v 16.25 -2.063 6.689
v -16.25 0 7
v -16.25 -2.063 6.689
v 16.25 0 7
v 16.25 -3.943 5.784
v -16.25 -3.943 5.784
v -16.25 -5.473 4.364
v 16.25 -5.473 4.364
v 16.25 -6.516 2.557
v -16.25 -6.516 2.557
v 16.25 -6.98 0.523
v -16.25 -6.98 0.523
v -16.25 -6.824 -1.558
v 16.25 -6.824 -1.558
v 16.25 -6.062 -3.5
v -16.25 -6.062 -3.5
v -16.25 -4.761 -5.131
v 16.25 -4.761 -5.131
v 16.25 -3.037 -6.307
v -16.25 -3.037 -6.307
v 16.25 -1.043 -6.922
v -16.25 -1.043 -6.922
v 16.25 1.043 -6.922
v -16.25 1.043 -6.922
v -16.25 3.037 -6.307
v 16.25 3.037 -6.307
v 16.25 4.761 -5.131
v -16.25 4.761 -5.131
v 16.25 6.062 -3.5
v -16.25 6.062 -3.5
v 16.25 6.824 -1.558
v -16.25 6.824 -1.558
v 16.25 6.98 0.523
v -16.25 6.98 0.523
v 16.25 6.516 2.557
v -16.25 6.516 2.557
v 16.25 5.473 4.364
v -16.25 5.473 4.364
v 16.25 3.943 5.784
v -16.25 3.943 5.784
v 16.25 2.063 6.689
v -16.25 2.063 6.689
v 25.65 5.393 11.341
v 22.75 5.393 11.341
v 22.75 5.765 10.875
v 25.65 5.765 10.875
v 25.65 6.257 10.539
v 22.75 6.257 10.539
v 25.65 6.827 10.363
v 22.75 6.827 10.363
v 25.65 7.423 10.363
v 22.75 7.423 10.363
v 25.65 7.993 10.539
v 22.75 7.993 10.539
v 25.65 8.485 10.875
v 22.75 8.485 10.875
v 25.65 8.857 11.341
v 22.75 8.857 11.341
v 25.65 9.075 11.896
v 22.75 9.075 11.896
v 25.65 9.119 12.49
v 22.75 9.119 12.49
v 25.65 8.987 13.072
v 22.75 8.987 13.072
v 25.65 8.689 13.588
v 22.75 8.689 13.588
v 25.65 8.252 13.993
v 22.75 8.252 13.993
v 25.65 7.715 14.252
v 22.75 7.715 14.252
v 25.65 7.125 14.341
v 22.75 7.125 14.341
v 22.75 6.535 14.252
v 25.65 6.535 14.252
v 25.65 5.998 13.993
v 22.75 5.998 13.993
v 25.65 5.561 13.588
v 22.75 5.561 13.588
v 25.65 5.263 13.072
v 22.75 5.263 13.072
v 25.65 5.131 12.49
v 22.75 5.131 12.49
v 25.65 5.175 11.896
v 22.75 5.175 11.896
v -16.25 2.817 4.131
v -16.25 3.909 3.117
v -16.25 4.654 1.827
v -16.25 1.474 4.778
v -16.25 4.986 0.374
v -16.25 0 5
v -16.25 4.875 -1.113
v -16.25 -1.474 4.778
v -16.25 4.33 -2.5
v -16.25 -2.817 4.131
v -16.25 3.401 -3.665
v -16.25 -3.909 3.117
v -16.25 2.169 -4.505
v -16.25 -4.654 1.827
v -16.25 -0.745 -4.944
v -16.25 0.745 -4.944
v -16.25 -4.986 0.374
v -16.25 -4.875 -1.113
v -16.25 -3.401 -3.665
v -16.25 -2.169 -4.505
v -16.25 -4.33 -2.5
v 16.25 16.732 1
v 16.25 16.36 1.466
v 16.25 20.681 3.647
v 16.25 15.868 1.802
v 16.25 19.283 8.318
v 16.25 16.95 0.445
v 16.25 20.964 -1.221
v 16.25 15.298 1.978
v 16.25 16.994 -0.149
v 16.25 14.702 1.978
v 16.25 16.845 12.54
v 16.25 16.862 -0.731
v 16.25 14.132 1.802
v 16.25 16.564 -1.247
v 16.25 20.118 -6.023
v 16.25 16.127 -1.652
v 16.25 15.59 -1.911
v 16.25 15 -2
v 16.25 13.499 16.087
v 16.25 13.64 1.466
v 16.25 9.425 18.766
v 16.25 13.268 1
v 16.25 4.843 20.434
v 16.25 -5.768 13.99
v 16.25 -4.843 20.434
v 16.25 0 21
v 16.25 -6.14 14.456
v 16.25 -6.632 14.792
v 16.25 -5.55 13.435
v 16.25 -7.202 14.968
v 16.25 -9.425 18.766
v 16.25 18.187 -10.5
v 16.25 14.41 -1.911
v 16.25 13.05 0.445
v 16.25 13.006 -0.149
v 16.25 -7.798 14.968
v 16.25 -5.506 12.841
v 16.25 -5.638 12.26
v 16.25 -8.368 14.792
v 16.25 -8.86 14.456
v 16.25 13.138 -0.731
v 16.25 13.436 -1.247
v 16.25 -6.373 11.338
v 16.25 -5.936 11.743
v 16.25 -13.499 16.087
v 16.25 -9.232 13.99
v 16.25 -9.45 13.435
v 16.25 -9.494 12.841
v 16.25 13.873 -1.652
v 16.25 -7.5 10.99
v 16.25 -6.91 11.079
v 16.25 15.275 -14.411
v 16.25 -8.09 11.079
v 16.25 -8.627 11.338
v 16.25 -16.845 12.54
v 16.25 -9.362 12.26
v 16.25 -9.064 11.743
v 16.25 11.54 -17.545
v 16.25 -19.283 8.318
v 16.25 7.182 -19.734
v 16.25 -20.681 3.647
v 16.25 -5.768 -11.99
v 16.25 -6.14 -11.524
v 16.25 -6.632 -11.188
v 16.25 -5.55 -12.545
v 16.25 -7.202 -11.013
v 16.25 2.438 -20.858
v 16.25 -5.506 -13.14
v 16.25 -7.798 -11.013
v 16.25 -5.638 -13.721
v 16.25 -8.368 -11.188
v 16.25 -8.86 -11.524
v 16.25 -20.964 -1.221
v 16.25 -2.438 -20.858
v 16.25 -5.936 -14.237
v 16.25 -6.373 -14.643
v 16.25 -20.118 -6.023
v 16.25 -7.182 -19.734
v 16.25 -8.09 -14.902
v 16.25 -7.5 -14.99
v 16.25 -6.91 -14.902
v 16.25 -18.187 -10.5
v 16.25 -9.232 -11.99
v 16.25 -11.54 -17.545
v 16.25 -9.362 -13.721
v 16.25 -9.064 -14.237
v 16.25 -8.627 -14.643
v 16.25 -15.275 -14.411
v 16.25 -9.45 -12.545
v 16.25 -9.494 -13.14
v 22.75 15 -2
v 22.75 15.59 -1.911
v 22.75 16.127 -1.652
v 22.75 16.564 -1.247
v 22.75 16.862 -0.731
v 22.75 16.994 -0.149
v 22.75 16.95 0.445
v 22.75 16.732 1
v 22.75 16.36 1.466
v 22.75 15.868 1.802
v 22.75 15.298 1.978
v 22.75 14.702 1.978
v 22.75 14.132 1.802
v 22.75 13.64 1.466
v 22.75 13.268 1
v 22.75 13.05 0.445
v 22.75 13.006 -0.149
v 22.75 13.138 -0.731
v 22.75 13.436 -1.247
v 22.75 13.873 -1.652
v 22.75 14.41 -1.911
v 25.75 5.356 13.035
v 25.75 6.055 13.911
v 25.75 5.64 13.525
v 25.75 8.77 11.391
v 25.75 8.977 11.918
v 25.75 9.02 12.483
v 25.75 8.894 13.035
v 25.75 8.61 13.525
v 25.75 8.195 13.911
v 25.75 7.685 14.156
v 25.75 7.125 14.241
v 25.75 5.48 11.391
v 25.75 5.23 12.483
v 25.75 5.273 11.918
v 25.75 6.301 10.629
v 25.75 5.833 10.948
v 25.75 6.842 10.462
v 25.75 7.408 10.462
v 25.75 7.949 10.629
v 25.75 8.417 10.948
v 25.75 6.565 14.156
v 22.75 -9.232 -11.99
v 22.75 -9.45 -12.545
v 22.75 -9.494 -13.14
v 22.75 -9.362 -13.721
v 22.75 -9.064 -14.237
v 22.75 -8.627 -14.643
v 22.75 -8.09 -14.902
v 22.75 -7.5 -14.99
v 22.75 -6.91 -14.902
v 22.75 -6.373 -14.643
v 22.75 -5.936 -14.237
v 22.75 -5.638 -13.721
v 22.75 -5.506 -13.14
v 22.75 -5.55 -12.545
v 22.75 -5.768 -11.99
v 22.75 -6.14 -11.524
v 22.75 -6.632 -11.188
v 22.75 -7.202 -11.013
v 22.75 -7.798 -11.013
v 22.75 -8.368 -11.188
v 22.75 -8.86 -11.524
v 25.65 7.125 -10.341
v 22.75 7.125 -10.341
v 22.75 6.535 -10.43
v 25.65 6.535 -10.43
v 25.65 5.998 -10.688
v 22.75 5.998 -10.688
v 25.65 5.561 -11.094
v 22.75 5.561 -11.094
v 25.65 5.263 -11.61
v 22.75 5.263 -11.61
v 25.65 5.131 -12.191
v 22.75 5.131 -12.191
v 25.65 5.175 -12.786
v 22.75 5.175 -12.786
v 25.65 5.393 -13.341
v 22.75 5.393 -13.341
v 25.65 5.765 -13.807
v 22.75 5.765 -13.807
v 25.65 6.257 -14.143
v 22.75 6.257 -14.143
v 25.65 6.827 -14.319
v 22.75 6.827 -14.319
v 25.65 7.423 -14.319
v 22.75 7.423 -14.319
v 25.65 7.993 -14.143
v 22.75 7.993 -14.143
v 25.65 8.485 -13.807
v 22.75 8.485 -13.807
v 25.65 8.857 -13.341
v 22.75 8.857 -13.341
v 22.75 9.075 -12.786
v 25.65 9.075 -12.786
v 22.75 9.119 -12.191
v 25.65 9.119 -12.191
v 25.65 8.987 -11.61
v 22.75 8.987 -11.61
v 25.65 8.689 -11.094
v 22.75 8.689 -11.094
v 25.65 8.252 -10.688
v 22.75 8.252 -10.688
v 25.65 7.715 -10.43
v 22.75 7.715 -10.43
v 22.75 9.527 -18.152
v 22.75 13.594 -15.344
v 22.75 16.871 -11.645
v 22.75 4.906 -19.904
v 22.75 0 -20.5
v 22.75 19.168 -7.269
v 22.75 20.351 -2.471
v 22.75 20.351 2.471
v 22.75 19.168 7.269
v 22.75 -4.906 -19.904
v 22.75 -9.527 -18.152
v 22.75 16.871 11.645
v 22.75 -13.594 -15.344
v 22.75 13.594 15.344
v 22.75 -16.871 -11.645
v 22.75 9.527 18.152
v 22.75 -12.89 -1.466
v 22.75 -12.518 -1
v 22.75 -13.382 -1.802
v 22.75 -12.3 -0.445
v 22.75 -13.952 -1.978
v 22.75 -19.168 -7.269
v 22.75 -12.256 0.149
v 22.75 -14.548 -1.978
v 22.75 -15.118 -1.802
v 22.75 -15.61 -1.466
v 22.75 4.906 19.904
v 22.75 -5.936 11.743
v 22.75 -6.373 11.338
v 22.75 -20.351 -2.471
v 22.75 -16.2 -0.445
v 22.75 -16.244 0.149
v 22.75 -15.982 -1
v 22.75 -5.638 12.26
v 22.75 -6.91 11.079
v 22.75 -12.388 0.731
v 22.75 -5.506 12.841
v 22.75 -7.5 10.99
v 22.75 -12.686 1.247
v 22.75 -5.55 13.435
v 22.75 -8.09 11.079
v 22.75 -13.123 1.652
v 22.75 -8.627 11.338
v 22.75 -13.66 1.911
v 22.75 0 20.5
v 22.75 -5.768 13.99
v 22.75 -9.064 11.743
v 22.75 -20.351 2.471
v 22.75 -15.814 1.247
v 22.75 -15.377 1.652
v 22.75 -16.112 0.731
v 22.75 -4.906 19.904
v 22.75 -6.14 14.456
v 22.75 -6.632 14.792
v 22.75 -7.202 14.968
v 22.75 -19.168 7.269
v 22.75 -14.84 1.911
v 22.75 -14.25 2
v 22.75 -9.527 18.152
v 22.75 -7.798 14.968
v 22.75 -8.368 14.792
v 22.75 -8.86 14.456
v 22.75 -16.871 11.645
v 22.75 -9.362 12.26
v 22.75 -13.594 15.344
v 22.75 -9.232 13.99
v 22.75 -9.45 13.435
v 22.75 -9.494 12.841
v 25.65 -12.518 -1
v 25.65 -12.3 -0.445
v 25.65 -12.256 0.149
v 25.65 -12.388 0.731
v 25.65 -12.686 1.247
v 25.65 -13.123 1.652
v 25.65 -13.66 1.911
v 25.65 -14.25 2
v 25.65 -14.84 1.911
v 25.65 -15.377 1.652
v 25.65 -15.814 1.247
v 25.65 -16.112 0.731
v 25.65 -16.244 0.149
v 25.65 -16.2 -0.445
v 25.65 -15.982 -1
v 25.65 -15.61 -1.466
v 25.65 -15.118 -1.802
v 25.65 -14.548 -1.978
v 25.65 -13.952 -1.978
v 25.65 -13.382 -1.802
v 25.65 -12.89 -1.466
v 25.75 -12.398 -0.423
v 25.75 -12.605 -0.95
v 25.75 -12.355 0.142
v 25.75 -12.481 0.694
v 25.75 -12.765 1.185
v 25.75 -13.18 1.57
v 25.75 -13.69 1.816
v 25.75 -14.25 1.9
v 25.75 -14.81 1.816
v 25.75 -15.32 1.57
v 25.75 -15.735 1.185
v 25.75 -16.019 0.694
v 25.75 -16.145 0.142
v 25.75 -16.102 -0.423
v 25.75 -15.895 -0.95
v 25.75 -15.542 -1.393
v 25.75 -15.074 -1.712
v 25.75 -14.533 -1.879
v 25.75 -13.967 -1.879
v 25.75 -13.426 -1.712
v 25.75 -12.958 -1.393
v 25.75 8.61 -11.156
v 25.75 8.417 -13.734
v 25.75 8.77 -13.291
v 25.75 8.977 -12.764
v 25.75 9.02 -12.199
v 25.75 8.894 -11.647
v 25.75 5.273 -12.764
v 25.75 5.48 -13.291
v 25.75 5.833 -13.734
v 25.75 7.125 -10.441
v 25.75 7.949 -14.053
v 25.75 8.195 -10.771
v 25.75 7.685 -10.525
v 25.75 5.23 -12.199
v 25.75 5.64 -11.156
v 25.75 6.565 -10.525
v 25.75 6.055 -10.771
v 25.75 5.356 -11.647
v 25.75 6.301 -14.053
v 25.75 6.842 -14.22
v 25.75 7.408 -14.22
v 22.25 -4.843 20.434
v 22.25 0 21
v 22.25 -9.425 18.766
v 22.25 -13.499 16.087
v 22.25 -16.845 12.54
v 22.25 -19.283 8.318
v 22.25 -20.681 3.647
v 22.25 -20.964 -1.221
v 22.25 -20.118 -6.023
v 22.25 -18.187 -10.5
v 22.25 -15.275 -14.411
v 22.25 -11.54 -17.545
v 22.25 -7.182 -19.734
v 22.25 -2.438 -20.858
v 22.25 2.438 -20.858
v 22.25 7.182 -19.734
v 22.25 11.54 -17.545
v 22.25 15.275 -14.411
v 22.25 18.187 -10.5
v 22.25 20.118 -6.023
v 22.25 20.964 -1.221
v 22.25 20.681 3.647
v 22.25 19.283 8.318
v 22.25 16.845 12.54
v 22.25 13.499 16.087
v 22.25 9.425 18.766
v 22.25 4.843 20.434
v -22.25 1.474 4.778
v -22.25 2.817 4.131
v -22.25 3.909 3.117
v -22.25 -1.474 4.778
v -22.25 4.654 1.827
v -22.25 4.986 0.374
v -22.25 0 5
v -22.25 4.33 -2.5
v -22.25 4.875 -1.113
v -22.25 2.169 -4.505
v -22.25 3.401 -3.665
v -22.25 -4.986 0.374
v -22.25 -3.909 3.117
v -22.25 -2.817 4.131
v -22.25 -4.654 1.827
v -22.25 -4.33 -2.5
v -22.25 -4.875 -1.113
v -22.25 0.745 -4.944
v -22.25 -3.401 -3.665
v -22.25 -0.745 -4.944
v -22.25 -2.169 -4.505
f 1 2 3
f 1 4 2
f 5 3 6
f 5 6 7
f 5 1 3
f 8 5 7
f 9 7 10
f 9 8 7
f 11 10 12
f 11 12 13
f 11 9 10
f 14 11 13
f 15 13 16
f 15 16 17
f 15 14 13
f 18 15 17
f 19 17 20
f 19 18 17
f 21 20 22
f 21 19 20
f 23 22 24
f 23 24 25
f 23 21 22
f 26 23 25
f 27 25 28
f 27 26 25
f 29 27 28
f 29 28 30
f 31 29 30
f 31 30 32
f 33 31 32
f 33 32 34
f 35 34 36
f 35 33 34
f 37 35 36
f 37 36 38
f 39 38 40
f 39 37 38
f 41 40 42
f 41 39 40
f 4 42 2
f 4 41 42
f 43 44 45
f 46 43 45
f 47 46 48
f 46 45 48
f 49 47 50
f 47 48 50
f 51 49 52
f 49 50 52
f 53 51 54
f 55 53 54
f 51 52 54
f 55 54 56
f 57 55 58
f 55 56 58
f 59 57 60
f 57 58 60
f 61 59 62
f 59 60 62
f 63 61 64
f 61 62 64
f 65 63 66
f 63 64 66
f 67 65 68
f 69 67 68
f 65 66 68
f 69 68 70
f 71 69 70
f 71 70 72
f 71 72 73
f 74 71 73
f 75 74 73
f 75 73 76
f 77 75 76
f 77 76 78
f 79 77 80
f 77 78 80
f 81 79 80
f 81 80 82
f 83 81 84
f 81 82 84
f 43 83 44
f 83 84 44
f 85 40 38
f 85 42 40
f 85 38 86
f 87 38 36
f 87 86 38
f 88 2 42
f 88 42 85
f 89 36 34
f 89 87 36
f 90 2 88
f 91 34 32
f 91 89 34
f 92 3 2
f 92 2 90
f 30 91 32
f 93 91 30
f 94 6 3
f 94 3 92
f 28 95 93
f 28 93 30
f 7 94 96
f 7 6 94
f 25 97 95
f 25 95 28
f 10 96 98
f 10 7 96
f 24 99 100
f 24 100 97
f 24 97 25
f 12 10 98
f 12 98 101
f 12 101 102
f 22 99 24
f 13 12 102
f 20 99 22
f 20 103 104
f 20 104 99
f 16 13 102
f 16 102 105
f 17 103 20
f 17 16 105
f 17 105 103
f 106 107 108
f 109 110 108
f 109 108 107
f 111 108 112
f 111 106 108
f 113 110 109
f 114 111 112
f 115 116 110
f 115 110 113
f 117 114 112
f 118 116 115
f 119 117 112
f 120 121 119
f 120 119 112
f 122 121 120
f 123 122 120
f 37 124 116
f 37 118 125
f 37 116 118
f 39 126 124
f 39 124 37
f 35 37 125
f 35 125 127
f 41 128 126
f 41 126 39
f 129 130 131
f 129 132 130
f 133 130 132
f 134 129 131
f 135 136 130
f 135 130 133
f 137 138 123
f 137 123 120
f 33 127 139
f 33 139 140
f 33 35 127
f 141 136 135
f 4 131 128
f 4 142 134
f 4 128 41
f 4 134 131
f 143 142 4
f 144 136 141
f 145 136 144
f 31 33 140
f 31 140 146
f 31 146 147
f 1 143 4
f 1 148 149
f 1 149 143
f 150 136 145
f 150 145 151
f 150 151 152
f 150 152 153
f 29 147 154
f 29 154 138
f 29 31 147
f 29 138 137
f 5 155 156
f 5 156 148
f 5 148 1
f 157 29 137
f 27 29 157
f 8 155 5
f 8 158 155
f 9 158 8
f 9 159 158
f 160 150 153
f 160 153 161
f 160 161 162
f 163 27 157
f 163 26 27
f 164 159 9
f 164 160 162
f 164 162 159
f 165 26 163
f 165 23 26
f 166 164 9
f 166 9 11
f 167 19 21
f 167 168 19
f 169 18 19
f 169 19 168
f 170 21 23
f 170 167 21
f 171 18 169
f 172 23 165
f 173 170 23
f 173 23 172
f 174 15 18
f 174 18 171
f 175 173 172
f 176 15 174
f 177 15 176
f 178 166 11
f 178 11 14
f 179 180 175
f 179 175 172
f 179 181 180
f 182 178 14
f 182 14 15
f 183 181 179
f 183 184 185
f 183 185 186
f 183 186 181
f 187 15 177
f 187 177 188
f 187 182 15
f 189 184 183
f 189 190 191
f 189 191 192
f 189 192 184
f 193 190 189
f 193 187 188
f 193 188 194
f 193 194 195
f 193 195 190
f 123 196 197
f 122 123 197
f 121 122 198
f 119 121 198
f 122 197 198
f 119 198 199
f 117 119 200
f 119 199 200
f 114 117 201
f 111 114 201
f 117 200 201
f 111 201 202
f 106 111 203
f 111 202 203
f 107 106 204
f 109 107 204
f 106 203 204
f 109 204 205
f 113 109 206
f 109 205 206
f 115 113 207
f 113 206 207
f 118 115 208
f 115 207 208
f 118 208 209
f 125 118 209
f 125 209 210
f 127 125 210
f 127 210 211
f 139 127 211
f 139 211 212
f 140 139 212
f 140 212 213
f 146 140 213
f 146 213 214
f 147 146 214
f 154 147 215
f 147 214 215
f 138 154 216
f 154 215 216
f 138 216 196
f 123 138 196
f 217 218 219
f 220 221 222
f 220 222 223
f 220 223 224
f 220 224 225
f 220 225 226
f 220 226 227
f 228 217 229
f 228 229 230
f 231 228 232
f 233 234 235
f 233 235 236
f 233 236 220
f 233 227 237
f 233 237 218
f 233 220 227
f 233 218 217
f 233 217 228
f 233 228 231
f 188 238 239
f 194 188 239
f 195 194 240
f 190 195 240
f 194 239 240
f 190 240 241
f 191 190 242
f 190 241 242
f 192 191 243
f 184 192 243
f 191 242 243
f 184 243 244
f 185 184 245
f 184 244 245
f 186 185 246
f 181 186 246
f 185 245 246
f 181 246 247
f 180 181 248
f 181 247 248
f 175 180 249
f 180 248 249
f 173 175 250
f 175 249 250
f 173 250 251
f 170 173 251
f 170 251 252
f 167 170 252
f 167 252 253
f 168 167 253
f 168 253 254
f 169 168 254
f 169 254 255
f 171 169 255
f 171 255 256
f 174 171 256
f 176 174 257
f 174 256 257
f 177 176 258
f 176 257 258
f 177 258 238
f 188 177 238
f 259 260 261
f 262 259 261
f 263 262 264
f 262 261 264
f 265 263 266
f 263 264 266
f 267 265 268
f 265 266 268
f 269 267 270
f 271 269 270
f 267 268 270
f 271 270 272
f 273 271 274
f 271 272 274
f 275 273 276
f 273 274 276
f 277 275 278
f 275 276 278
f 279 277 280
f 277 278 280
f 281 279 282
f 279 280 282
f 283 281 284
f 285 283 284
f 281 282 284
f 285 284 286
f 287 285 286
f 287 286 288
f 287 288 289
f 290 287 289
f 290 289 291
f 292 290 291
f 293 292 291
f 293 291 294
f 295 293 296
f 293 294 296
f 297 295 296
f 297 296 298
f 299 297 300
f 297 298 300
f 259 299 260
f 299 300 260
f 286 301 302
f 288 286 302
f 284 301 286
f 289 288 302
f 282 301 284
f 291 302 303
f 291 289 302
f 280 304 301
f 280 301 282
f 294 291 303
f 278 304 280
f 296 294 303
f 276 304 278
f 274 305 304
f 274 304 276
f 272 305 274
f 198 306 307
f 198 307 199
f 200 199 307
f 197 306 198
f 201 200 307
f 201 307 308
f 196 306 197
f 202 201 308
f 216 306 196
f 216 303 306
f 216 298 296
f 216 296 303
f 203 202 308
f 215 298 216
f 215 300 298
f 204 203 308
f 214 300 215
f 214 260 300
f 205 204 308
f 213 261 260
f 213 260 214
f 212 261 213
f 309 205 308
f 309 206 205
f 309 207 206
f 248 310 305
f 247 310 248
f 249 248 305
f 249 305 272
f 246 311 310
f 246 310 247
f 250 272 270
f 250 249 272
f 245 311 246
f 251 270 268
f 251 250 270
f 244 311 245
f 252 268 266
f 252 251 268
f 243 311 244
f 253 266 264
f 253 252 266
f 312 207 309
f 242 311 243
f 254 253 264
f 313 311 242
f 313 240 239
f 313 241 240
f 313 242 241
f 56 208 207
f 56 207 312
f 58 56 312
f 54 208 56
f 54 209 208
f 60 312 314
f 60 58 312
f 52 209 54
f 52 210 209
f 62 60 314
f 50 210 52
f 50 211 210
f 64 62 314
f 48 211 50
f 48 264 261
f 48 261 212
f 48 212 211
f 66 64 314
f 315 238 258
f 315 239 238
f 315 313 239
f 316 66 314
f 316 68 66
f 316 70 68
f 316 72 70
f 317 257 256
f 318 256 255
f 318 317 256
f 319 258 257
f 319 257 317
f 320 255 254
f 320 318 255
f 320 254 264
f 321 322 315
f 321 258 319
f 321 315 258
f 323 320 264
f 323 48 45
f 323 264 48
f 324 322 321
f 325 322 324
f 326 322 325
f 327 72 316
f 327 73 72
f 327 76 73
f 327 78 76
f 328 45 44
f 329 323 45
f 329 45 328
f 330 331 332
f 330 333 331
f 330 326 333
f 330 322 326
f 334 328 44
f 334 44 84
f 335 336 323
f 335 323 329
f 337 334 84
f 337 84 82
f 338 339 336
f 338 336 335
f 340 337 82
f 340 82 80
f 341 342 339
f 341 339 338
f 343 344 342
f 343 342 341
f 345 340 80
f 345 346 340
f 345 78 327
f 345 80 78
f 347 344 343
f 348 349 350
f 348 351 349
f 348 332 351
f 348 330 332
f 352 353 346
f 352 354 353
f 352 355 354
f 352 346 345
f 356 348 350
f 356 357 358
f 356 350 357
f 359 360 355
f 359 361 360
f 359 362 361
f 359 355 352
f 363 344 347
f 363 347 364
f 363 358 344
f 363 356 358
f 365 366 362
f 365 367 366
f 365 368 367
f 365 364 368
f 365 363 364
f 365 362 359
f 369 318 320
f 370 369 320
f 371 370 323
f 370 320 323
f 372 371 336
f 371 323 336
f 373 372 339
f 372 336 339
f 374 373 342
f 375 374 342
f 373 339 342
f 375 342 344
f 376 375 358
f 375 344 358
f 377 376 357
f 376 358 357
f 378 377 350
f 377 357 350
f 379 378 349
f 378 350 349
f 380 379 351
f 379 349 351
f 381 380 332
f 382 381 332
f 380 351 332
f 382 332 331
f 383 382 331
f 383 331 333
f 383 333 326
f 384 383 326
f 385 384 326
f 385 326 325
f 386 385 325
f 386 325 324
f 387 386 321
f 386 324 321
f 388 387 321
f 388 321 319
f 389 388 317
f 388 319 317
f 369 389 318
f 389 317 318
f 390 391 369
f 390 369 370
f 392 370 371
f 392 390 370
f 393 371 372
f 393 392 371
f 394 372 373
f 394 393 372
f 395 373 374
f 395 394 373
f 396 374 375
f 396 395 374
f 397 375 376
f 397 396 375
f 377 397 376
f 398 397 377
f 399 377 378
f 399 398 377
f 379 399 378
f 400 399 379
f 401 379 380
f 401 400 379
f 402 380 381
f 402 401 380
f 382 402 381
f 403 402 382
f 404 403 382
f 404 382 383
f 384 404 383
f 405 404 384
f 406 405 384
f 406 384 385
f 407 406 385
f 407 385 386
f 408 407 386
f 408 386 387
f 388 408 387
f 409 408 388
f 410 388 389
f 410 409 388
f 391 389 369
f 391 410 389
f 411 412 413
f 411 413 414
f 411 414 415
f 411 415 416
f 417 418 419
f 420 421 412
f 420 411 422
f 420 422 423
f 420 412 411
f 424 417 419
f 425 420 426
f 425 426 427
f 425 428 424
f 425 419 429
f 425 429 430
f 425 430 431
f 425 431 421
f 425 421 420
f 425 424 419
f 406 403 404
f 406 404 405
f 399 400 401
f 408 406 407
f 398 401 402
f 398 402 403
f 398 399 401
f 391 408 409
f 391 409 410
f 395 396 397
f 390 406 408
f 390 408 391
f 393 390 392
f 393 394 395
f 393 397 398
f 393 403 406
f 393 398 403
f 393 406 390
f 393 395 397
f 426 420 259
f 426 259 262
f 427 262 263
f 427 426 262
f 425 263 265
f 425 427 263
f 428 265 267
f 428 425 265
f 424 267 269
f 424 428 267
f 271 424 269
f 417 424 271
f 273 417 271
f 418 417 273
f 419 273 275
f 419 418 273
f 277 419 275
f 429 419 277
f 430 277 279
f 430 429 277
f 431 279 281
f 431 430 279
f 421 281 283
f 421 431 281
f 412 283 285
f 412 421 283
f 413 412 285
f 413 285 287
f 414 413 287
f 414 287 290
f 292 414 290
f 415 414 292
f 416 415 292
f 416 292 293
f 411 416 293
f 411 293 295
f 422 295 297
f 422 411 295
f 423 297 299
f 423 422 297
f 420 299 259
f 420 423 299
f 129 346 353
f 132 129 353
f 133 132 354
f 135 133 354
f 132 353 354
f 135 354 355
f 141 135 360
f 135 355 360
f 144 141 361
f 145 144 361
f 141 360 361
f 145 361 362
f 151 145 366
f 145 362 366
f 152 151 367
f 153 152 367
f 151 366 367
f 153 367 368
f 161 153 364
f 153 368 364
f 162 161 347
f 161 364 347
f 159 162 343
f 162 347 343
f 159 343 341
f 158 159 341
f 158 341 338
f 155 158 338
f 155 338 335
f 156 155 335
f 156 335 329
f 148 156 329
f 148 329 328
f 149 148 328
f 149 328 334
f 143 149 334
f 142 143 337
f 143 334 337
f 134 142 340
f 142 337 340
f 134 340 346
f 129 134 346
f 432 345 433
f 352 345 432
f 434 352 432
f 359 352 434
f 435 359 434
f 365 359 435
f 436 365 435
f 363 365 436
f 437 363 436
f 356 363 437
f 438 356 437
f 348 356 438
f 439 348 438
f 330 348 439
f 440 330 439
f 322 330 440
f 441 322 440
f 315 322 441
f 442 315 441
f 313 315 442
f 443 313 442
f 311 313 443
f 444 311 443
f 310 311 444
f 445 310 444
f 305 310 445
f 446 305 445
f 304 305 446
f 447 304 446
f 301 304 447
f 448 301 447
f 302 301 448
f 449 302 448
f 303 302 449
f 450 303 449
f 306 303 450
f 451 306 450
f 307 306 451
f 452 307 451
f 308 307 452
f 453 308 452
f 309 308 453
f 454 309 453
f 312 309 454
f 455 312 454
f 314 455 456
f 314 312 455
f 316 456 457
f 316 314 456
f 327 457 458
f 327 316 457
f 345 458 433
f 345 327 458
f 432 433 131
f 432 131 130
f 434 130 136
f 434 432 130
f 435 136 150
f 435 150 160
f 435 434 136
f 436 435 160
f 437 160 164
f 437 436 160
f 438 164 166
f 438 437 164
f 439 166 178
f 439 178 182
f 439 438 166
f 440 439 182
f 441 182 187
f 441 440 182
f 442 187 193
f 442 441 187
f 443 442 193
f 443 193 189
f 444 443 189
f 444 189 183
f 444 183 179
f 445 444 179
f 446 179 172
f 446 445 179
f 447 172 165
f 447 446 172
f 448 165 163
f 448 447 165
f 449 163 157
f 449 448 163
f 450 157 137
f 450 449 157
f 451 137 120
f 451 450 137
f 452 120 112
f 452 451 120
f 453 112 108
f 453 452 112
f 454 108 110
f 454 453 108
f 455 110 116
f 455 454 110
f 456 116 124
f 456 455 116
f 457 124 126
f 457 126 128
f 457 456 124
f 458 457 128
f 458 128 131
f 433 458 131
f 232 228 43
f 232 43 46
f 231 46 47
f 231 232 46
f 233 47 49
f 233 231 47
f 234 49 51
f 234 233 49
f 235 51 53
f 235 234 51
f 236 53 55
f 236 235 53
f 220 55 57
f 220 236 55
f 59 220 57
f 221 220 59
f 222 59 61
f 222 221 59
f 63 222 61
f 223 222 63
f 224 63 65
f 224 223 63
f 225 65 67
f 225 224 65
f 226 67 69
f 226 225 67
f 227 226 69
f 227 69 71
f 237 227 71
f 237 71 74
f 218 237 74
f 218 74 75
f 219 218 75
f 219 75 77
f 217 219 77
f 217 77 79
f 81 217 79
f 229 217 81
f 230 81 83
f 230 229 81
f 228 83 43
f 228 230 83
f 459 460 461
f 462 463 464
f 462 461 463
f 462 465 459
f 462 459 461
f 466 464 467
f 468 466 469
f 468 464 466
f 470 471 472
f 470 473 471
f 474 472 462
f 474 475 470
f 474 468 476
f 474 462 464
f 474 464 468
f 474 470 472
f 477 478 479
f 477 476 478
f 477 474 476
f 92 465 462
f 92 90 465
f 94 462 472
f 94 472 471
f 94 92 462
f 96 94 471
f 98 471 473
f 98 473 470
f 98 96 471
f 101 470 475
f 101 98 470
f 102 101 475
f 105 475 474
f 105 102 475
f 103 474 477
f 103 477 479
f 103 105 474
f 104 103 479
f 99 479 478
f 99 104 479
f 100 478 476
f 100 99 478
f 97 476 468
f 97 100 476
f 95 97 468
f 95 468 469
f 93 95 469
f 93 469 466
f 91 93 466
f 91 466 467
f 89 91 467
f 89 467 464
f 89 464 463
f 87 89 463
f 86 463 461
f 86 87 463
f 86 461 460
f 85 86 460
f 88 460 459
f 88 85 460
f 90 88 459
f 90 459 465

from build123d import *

# Parameters (mm, degrees)
CHAMFER1_SIZE                = 0.5
SKETCH2_R                    = 2
CUT_EXTRUDE1_DEPTH           = 6.5
CIRPATTERN1_COUNT            = 3
SKETCH3_R                    = 2
BOSS_EXTRUDE1_DEPTH          = 3
CHAMFER2_SIZE                = 0.1
CIRPATTERN3_COUNT            = 3
CHAMFER2_OF_CIRPATTERN3_SIZE = 0.1


with BuildPart() as part:
    # Sketch1 → Revolve1 (revolve)
    with BuildSketch(Plane.XY, mode=Mode.PRIVATE) as revolve1_sk:
        Polygon((-22.25, 0), (-22.25, 5), (-16.25, 5), (-16.25, 7), (16.25, 7), (16.25, 21), (22.75, 21), (22.75, 0), align=None)
    revolve(revolve1_sk.sketch.rotate(Axis((-54.078202457, 0, 0), (1, 0, 0)), 90), axis=Axis((-54.078202457, 0, 0), (1, 0, 0)))

    # Chamfer1
    chamfer1_edges = [part.edges().sort_by_distance(p)[0] for p in [
        (22.75, 0, -21),
    ]]
    chamfer(chamfer1_edges, length=CHAMFER1_SIZE)

    # Sketch2 → Cut-Extrude1 (cut)
    with BuildSketch(Plane(origin=(22.75, 0, 0), x_dir=(0, 0, -1), z_dir=(1, 0, 0))):
        with Locations((0, 15)):
            Circle(SKETCH2_R)
    cut_extrude1 = extrude(amount=-CUT_EXTRUDE1_DEPTH, mode=Mode.SUBTRACT)

    # CirPattern1: Cut-Extrude1 ×3 about axis
    cirpattern1_axis = Axis((0, 0, 0), (1, 0, 0))
    for i in range(1, CIRPATTERN1_COUNT):
        add(cut_extrude1.rotate(cirpattern1_axis, i * 360 / CIRPATTERN1_COUNT), mode=Mode.SUBTRACT)

    # Sketch3 → Boss-Extrude1 (add)
    with BuildSketch(Plane(origin=(22.75, 0, 0), x_dir=(0, 0, -1), z_dir=(1, 0, 0))):
        with Locations(Location((12.340862004, 7.125, 0), (0, 0, 180))):
            Circle(SKETCH3_R)
    boss_extrude1 = extrude(amount=BOSS_EXTRUDE1_DEPTH)

    # Chamfer2
    chamfer2_edges = [part.edges().sort_by_distance(p)[0] for p in [
        (25.75, 7.125, -14.340862004),
    ]]
    chamfer(chamfer2_edges, length=CHAMFER2_SIZE)

    # CirPattern3: Boss-Extrude1 ×3 about axis
    cirpattern3_axis = Axis((0, 0, 0), (1, 0, 0))
    for i in range(1, CIRPATTERN3_COUNT):
        add(boss_extrude1.rotate(cirpattern3_axis, i * 360 / CIRPATTERN3_COUNT))

    # Chamfer2 of CirPattern3
    chamfer2_of_cirpattern3_edges = [part.edges().sort_by_distance(p)[0] for p in [
        (25.75, 8.857050808, 13.340862004),
        (25.75, -15.982050808, 1),
    ]]
    chamfer(chamfer2_of_cirpattern3_edges, length=CHAMFER2_OF_CIRPATTERN3_SIZE)


solid = part.part
